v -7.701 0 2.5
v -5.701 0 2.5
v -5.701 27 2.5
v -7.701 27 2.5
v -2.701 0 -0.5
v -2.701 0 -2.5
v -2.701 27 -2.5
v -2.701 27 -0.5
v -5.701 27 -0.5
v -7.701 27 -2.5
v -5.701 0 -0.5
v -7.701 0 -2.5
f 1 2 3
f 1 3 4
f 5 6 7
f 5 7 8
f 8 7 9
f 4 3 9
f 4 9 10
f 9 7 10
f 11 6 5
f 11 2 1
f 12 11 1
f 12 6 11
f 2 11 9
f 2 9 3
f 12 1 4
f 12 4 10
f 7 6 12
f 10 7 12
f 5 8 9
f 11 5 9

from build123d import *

# Parameters (mm, degrees)
BOSS_EXTRUDE1_DEPTH = 27


with BuildPart() as part:
    # Sketch1 → Boss-Extrude1 (new body)
    with BuildSketch(Plane(origin=(0, 0, 0), x_dir=(1, 0, 0), z_dir=(0, 1, 0))):
        Polygon((-6.432391634, 2.5), (-2.701042517, 2.5), (-2.701042517, 0.5), (-5.701042517, 0.5), (-5.701042517, -2.5), (-7.701042517, -2.5), (-7.701042517, 2.5), align=None)
    extrude(amount=BOSS_EXTRUDE1_DEPTH)


solid = part.part
